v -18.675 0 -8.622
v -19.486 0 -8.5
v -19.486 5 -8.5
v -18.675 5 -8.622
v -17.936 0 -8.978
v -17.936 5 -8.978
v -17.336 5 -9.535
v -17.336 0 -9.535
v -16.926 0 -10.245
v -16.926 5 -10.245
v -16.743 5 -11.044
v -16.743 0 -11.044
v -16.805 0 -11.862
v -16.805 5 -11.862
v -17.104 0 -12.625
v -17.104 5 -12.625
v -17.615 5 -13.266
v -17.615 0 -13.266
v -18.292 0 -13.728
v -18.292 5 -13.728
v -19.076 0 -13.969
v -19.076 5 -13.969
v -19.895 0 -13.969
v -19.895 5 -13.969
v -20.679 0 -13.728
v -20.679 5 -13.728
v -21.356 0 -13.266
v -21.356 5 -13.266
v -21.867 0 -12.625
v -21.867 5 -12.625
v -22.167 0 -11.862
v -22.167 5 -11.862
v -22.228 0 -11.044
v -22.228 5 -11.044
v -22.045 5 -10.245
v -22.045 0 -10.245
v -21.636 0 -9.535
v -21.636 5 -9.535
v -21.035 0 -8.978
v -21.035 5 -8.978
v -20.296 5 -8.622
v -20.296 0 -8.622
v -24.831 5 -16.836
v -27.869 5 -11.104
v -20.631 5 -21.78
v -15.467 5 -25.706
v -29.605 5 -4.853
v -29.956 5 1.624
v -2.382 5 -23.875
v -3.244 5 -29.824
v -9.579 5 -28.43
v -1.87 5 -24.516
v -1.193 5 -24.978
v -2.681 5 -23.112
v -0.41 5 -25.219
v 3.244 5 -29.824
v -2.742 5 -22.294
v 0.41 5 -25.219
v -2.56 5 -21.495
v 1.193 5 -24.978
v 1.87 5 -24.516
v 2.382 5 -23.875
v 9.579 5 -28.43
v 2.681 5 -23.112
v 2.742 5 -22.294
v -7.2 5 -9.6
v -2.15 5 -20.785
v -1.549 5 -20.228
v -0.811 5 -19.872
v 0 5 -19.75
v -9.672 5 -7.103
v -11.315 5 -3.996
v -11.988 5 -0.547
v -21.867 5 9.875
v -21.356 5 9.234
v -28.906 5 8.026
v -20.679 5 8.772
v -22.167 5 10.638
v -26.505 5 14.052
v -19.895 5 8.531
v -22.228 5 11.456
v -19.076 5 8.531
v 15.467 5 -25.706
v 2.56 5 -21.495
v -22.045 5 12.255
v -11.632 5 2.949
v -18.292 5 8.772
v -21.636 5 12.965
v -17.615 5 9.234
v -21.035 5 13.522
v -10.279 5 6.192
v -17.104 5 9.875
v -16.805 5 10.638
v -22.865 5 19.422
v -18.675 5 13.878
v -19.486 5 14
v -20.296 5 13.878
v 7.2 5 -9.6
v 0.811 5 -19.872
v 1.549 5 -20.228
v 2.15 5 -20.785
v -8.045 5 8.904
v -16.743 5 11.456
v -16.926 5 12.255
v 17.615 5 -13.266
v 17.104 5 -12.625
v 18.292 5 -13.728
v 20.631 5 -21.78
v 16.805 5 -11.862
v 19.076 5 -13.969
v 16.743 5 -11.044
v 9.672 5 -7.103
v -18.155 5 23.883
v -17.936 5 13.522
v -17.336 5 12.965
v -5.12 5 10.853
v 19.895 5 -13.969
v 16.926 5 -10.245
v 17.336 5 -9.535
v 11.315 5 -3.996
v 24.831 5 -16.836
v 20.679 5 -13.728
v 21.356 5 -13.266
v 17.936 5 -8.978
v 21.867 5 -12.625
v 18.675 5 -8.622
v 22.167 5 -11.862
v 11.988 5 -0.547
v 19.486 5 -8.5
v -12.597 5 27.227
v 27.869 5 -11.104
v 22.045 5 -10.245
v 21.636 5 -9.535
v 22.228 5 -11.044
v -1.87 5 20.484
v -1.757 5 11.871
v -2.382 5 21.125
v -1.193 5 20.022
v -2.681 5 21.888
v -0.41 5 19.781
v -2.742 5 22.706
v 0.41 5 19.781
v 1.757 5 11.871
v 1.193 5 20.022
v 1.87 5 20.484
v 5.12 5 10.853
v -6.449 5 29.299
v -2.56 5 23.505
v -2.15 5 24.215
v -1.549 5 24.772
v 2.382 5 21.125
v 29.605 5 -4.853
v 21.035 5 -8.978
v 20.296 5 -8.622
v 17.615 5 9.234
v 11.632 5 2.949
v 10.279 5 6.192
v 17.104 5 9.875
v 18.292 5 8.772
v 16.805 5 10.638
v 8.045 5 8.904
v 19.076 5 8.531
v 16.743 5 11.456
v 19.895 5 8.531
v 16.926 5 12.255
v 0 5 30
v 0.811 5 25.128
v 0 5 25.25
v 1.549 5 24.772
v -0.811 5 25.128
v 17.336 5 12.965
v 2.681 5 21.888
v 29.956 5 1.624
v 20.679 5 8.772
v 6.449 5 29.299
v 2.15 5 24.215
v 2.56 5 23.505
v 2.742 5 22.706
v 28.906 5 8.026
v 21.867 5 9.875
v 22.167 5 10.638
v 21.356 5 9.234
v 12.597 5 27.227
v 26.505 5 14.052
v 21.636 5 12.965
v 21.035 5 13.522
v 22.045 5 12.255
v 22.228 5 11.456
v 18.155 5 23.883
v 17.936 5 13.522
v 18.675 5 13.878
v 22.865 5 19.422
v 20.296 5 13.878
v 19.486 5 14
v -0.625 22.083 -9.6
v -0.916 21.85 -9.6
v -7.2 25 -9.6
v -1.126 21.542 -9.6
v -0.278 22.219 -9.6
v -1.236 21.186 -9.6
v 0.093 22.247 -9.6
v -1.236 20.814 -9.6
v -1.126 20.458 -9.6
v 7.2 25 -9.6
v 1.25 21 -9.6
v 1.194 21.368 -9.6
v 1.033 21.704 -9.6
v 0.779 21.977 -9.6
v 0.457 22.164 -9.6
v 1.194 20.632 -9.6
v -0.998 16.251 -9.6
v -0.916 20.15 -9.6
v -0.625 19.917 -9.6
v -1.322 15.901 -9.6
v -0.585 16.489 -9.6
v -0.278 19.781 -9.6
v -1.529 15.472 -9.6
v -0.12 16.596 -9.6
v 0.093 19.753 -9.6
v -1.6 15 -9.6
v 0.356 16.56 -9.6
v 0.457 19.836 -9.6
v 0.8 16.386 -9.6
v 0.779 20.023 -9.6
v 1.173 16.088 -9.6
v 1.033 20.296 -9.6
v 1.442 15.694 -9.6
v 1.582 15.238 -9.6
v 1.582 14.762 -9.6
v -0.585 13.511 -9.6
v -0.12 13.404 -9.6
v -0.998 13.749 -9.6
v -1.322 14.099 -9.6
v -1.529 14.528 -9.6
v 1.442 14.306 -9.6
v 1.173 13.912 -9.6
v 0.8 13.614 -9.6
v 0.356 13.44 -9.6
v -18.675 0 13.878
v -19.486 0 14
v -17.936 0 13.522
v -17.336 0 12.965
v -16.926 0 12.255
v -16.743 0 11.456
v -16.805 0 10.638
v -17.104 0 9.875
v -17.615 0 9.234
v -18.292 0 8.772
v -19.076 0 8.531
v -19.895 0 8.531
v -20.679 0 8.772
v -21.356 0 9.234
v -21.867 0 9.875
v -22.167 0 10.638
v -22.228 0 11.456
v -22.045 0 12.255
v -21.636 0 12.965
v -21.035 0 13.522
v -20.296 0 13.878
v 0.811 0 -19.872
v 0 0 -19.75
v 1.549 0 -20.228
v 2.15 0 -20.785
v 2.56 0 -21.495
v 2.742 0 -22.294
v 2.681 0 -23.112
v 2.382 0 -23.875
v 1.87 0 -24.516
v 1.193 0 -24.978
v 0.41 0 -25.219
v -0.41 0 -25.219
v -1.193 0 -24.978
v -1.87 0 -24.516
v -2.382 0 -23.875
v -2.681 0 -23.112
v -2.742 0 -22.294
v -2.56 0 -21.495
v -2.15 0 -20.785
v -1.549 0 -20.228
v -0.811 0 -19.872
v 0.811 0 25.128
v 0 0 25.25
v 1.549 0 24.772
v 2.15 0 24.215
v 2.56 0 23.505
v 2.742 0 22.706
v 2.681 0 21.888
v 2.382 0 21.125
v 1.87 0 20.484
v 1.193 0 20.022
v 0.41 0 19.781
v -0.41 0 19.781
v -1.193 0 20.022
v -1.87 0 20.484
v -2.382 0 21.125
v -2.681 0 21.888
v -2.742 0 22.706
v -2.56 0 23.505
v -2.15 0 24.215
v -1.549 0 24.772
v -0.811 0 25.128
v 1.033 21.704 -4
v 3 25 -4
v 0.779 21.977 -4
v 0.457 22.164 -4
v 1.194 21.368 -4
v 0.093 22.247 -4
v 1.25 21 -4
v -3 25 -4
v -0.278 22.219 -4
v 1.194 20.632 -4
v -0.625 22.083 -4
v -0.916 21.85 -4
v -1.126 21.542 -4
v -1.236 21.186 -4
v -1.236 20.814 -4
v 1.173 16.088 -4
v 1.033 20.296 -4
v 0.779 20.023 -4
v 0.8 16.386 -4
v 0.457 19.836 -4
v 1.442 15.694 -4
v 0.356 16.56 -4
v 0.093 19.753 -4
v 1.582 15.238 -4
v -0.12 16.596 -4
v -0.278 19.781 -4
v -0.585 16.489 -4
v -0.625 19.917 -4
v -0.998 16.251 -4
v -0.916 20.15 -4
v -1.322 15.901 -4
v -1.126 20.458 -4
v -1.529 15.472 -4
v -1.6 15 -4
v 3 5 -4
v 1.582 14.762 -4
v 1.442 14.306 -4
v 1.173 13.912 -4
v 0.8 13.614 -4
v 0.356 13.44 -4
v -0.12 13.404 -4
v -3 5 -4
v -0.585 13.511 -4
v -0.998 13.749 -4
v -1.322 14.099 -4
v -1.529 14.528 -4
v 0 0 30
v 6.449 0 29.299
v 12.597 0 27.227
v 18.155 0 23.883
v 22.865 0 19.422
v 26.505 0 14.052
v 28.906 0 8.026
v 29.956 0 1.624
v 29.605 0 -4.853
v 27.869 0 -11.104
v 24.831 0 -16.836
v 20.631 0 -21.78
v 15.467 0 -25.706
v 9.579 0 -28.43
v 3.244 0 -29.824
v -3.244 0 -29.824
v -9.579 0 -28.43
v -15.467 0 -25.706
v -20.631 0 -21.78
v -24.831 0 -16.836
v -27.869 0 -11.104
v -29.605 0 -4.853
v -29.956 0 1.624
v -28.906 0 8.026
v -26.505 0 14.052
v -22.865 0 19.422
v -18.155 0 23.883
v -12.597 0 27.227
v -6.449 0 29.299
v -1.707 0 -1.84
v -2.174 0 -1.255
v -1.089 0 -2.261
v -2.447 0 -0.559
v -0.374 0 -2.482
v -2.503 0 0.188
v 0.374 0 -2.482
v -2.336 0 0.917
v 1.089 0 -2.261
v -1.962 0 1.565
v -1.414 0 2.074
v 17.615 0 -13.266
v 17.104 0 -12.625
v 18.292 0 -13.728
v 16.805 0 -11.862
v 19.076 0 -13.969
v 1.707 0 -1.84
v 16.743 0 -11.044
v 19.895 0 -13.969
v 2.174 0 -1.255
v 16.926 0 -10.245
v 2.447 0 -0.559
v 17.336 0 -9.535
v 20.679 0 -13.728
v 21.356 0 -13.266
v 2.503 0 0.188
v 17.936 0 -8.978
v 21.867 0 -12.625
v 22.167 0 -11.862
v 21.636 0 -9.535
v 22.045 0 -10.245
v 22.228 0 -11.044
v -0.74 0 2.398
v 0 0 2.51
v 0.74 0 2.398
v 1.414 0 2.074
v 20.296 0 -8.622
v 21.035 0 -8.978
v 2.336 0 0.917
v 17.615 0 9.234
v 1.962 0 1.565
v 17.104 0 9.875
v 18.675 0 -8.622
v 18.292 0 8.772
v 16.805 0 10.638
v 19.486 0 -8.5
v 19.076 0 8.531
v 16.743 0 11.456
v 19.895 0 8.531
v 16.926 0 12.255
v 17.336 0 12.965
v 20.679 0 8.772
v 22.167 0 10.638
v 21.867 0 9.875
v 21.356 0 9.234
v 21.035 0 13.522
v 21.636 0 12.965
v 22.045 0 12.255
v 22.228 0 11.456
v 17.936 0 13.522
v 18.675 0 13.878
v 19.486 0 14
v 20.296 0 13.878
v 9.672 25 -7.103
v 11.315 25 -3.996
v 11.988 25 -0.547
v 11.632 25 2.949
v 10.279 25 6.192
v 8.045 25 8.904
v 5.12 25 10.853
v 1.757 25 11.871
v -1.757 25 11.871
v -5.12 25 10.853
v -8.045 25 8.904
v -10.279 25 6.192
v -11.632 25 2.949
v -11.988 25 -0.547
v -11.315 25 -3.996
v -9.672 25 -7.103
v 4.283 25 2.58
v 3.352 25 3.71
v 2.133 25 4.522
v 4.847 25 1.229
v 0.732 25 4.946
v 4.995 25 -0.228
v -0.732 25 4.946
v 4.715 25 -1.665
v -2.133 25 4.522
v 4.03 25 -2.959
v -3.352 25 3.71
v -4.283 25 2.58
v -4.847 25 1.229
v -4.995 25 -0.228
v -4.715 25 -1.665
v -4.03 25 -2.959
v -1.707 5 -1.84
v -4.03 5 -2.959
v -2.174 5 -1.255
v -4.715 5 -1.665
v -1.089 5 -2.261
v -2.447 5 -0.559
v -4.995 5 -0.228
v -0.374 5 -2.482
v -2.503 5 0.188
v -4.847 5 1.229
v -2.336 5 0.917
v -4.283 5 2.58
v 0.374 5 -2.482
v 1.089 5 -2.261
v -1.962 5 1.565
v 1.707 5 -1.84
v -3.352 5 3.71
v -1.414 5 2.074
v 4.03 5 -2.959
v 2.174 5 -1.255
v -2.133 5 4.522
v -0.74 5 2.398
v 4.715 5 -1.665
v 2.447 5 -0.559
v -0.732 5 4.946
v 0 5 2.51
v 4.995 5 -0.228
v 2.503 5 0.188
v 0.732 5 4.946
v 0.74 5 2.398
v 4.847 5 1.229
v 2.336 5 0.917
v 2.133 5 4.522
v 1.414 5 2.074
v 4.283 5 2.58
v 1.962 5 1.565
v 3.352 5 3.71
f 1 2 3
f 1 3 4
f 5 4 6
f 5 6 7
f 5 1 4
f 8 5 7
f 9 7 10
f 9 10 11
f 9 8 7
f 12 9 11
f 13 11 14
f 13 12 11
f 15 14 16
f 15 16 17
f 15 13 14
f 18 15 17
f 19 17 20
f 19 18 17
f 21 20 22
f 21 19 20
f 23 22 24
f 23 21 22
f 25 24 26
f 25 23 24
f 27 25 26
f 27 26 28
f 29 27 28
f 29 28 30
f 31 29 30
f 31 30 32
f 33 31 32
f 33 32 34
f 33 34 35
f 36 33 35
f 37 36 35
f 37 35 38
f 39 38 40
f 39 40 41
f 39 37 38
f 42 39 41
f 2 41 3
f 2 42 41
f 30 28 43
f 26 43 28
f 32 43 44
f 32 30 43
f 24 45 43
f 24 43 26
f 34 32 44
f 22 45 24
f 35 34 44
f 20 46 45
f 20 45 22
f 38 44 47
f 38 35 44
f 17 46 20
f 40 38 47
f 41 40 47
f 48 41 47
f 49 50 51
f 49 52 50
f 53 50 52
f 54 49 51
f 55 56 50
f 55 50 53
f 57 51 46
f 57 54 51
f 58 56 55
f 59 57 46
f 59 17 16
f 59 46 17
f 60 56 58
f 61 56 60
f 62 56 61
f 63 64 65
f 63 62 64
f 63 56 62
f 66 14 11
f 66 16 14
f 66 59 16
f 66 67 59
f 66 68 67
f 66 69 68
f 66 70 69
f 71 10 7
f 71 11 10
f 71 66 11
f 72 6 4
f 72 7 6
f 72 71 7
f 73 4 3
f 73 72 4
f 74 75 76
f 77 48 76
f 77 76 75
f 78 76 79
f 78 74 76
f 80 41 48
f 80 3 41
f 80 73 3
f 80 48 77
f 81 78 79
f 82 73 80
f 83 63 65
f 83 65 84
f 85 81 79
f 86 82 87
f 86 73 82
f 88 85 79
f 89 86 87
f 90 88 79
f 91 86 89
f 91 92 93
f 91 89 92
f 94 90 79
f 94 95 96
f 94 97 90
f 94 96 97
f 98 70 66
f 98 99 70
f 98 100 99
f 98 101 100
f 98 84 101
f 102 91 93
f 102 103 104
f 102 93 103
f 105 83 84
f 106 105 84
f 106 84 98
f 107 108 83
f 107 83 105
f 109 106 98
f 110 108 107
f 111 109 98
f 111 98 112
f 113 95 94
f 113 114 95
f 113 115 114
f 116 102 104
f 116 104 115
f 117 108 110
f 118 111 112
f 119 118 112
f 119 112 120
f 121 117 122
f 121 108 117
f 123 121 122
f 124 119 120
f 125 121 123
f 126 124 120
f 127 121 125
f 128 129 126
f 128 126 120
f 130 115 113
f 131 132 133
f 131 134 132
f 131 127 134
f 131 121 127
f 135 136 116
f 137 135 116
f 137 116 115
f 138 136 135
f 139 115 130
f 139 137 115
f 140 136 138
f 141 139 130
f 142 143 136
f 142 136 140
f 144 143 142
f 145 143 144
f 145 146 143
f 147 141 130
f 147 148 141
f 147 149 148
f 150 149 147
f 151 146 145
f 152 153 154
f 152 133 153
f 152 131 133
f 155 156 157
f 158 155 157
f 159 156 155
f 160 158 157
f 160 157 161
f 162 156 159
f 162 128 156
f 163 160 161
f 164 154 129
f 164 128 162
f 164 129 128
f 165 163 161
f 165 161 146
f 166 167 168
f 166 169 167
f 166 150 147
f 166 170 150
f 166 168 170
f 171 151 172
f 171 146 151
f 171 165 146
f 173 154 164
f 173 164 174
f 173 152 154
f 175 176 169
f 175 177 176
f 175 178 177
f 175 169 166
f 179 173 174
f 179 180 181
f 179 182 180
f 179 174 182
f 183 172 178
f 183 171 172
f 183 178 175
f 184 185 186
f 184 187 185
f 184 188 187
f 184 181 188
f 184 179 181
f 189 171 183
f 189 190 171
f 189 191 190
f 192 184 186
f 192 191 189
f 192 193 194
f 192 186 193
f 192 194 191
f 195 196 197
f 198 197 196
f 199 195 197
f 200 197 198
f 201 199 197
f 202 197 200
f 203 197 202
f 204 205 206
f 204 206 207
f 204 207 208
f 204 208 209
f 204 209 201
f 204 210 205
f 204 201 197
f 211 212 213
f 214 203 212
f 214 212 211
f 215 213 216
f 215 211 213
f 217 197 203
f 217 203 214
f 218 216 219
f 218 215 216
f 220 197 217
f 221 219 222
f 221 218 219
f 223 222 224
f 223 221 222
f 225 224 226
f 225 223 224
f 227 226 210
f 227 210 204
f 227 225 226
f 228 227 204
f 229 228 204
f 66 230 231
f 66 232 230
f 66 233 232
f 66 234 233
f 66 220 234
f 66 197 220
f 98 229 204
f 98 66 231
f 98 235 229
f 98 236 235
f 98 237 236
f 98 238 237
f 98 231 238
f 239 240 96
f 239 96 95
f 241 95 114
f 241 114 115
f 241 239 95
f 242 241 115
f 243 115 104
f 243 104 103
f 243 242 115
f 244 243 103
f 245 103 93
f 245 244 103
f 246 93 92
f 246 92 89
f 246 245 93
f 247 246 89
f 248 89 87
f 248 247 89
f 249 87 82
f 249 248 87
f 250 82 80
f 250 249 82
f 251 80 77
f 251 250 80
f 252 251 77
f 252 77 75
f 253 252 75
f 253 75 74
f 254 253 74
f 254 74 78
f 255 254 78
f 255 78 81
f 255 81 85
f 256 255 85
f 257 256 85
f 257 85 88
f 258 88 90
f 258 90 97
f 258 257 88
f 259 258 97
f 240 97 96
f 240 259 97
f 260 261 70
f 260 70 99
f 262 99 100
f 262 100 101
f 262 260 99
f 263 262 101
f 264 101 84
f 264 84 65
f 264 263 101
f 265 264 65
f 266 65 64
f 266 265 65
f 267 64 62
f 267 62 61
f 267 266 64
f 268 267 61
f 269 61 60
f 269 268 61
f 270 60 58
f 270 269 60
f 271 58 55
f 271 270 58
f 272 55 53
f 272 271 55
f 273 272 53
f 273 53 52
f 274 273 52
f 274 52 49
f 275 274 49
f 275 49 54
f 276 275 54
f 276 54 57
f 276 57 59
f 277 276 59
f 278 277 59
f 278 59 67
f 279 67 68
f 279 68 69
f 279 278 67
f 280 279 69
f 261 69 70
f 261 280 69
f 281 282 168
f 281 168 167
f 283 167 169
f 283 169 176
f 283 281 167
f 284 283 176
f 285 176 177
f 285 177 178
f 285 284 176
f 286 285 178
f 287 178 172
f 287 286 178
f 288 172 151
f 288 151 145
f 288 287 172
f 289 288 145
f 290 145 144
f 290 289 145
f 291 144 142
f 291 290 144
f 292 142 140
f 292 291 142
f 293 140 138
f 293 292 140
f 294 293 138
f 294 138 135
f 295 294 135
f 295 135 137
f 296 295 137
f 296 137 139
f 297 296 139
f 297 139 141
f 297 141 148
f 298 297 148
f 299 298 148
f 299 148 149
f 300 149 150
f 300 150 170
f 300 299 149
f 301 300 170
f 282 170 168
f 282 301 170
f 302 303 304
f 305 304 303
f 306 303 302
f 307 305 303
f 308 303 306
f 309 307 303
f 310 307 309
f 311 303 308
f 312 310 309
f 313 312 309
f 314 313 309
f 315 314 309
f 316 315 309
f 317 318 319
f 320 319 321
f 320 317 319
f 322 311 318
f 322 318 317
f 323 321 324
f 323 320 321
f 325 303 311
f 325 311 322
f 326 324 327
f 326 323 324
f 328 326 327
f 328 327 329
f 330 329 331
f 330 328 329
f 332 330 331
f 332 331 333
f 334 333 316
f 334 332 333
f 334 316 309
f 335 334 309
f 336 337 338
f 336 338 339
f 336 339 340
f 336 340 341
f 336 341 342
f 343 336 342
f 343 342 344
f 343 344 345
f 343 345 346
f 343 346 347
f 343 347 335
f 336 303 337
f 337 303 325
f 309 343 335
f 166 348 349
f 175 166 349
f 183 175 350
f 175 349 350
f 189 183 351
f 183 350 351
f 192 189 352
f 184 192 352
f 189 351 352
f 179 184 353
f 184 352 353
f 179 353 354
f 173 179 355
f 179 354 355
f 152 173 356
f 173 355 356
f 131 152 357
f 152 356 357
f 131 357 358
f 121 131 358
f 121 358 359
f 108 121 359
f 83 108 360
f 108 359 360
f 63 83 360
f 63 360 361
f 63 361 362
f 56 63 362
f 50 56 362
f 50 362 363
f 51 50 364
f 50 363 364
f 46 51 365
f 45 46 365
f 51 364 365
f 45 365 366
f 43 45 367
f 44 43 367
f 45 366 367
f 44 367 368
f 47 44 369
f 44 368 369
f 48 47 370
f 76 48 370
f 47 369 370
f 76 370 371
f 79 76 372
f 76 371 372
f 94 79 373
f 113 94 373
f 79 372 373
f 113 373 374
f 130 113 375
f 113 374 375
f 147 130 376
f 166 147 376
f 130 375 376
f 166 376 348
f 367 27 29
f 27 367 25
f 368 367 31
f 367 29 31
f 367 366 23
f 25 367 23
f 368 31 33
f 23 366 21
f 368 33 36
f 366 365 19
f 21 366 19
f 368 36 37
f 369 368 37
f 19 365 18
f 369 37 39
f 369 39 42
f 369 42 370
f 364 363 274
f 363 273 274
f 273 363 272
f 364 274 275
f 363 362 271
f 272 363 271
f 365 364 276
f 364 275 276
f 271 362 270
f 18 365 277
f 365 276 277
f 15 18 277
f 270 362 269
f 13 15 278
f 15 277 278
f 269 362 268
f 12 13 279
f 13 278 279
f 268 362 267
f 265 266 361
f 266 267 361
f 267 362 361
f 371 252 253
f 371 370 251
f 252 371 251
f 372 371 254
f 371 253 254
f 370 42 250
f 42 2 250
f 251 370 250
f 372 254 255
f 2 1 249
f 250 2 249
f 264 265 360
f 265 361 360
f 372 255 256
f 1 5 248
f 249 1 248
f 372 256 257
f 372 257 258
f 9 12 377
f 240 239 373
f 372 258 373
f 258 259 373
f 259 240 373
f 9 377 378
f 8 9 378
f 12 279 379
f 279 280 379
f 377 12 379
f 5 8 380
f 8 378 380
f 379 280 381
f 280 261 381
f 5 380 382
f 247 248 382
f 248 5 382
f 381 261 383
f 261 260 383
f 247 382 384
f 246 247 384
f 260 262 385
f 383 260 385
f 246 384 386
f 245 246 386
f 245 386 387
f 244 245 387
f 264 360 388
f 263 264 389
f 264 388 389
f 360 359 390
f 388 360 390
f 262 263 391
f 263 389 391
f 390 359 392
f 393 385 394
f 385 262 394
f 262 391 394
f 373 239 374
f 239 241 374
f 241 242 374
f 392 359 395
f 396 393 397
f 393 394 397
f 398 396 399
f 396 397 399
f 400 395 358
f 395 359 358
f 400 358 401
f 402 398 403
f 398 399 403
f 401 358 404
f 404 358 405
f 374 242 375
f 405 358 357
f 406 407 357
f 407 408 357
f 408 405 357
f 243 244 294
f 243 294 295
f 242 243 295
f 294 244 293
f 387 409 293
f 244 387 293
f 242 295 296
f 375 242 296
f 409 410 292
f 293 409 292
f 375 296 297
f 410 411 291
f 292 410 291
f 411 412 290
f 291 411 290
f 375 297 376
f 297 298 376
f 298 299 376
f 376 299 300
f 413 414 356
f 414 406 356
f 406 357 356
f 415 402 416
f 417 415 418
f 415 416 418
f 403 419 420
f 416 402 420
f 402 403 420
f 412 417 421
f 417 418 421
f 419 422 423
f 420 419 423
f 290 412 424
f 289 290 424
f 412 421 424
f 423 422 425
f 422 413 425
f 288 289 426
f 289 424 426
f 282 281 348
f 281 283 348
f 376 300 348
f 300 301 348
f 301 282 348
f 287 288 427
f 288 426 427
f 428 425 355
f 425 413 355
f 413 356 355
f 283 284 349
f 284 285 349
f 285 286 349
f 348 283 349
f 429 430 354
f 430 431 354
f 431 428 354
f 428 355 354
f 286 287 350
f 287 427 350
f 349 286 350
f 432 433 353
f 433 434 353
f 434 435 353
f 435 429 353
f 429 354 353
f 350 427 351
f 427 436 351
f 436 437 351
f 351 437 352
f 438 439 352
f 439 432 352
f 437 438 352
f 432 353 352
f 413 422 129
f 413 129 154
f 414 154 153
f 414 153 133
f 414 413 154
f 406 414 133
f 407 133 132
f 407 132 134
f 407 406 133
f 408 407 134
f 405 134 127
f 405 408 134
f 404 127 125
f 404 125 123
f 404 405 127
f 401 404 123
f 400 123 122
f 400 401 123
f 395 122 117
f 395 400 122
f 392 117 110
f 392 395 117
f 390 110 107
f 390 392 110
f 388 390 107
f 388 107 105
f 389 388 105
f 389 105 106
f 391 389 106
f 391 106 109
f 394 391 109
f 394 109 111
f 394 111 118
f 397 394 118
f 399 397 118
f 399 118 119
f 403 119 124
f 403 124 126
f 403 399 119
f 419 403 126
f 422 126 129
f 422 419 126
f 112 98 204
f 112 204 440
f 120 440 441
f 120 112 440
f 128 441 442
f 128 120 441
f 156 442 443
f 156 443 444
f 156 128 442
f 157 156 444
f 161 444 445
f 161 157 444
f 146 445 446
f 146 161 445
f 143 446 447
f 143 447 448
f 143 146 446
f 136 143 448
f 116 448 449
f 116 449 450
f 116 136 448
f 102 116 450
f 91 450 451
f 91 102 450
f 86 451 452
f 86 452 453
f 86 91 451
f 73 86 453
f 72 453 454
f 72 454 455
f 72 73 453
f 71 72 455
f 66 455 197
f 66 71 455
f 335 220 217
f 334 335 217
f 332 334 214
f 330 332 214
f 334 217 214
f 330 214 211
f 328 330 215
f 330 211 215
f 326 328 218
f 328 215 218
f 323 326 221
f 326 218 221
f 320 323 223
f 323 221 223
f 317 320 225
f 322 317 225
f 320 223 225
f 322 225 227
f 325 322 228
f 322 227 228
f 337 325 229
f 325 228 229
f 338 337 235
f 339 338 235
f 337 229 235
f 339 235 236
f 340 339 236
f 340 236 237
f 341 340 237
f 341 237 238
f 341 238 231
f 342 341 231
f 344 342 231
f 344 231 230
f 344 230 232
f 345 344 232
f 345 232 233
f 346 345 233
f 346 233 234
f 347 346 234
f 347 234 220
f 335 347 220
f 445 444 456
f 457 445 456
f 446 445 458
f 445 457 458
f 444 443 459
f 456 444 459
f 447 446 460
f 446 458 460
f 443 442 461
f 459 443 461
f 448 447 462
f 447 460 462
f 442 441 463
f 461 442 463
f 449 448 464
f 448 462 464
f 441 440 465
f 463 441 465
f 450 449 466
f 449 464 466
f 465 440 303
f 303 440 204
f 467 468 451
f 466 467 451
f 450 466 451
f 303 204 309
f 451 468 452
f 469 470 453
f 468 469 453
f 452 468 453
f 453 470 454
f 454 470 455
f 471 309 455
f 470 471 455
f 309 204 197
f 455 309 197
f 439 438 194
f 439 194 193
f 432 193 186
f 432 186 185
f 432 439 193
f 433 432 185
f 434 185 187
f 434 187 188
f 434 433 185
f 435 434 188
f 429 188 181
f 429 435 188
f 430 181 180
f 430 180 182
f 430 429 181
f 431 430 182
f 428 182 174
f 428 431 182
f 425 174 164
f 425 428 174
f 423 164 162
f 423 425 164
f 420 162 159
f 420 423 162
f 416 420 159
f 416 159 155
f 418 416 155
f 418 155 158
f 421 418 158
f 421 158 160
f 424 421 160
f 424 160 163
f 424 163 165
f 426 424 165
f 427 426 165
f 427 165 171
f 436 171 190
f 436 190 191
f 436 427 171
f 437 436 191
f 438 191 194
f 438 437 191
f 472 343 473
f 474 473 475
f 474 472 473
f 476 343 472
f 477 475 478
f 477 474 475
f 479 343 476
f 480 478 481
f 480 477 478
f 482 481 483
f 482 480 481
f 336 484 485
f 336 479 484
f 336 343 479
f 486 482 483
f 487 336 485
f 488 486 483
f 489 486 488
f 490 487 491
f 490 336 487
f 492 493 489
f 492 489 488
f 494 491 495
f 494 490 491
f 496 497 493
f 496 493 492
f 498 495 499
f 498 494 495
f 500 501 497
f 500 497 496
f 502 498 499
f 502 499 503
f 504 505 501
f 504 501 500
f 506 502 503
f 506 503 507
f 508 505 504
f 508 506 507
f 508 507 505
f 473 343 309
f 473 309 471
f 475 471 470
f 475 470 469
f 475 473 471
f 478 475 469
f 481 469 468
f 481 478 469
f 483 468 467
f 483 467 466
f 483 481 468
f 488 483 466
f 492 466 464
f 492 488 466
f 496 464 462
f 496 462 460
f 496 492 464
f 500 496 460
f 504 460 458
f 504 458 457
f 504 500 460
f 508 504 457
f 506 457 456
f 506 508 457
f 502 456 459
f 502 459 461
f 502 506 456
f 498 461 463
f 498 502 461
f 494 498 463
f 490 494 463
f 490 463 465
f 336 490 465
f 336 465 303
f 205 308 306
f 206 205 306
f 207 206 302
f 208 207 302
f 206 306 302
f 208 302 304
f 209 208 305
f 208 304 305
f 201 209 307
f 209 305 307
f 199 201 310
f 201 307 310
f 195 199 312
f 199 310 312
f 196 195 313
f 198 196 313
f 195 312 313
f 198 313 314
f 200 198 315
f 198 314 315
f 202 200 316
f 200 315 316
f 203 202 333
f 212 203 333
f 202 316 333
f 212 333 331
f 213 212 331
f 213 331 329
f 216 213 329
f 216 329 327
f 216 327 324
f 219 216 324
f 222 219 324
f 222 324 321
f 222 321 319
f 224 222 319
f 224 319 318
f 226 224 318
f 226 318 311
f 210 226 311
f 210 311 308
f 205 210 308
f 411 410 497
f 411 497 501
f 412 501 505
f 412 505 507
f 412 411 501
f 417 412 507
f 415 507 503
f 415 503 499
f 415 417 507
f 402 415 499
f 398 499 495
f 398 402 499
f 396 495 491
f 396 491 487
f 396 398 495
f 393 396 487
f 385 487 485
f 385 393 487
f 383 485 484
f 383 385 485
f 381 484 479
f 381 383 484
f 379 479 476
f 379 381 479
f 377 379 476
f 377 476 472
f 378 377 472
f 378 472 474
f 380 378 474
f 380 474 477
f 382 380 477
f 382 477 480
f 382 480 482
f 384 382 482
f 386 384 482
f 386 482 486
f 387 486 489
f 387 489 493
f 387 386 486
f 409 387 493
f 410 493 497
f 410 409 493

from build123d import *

# Parameters (mm, degrees)
SKETCH_1_R             = 30
SKETCH_1_R_2           = 2.75
SKETCH_1_R_3           = 2.51
EXTRUDE_1_DEPTH        = 5
EXTRUDE_2_DEPTH        = 20
HOLE_WIZARD_M3_1_D     = 2.5
HOLE_WIZARD_M3_1_DEPTH = 5.6
CUT_EXTRUDE_1_REACH    = 57.616
SKETCH_5_R             = 1.6


with BuildPart() as part:
    # 草图1 → 凸台-拉伸1 (new body)
    with BuildSketch(Plane(origin=(0, 0, 0), x_dir=(1, 0, 0), z_dir=(0, 1, 0))):
        with Locations(Location((0, 0, 0), (0, 0, 270))):
            Circle(SKETCH_1_R)
        with Locations(Location((0, 22.5, 0), (0, 0, 270))):
            Circle(SKETCH_1_R_2, mode=Mode.SUBTRACT)
        with Locations(Location((19.485571585, 11.25, 0), (0, 0, 270))):
            Circle(SKETCH_1_R_2, mode=Mode.SUBTRACT)
        with Locations(Location((19.485571585, -11.25, 0), (0, 0, 270))):
            Circle(SKETCH_1_R_2, mode=Mode.SUBTRACT)
        with Locations(Location((0, -22.5, 0), (0, 0, 270))):
            Circle(SKETCH_1_R_2, mode=Mode.SUBTRACT)
        with Locations(Location((-19.485571585, -11.25, 0), (0, 0, 270))):
            Circle(SKETCH_1_R_2, mode=Mode.SUBTRACT)
        with Locations(Location((-19.485571585, 11.25, 0), (0, 0, 270))):
            Circle(SKETCH_1_R_2, mode=Mode.SUBTRACT)
        with Locations(Location((0, 0, 0), (0, 0, 270))):
            Circle(SKETCH_1_R_3, mode=Mode.SUBTRACT)
    extrude(amount=EXTRUDE_1_DEPTH)

    # 草图2 → 凸台-拉伸2 (add)
    with BuildSketch(Plane(origin=(0, 5, 0), x_dir=(1, 0, 0), z_dir=(0, 1, 0))):
        with BuildLine():
            Line((-7.2, 9.6), (7.2, 9.6))
            ThreePointArc((7.2, 9.6), (0, -12), (-7.2, 9.6))
        make_face()
        with BuildLine():
            Line((3, 4), (-3, 4))
            ThreePointArc((-3, 4), (0, -5), (3, 4))
        make_face(mode=Mode.SUBTRACT)
    extrude(amount=EXTRUDE_2_DEPTH)

    # M3 螺纹孔1
    with Locations(Plane(origin=(0, 0, -9.6), x_dir=(-1, 0, 0), z_dir=(0, 0, -1))):
        with Locations((0, 21)):
            Hole(HOLE_WIZARD_M3_1_D / 2, depth=HOLE_WIZARD_M3_1_DEPTH)

    # 草图5 → 切除-拉伸1 (cut, up to next)
    with BuildSketch(Plane(origin=(0, 0, -9.6), x_dir=(-1, 0, 0), z_dir=(0, 0, -1)), mode=Mode.PRIVATE) as cut_extrude_1_sk1:
        with Locations((0, 15)):
            Circle(SKETCH_5_R)
    cut_extrude_1_tool1 = extrude(cut_extrude_1_sk1.sketch, amount=-CUT_EXTRUDE_1_REACH, mode=Mode.PRIVATE) & part.part
    add(cut_extrude_1_tool1.solids().sort_by_distance((0, 15, -9.6))[0], mode=Mode.SUBTRACT)


solid = part.part
